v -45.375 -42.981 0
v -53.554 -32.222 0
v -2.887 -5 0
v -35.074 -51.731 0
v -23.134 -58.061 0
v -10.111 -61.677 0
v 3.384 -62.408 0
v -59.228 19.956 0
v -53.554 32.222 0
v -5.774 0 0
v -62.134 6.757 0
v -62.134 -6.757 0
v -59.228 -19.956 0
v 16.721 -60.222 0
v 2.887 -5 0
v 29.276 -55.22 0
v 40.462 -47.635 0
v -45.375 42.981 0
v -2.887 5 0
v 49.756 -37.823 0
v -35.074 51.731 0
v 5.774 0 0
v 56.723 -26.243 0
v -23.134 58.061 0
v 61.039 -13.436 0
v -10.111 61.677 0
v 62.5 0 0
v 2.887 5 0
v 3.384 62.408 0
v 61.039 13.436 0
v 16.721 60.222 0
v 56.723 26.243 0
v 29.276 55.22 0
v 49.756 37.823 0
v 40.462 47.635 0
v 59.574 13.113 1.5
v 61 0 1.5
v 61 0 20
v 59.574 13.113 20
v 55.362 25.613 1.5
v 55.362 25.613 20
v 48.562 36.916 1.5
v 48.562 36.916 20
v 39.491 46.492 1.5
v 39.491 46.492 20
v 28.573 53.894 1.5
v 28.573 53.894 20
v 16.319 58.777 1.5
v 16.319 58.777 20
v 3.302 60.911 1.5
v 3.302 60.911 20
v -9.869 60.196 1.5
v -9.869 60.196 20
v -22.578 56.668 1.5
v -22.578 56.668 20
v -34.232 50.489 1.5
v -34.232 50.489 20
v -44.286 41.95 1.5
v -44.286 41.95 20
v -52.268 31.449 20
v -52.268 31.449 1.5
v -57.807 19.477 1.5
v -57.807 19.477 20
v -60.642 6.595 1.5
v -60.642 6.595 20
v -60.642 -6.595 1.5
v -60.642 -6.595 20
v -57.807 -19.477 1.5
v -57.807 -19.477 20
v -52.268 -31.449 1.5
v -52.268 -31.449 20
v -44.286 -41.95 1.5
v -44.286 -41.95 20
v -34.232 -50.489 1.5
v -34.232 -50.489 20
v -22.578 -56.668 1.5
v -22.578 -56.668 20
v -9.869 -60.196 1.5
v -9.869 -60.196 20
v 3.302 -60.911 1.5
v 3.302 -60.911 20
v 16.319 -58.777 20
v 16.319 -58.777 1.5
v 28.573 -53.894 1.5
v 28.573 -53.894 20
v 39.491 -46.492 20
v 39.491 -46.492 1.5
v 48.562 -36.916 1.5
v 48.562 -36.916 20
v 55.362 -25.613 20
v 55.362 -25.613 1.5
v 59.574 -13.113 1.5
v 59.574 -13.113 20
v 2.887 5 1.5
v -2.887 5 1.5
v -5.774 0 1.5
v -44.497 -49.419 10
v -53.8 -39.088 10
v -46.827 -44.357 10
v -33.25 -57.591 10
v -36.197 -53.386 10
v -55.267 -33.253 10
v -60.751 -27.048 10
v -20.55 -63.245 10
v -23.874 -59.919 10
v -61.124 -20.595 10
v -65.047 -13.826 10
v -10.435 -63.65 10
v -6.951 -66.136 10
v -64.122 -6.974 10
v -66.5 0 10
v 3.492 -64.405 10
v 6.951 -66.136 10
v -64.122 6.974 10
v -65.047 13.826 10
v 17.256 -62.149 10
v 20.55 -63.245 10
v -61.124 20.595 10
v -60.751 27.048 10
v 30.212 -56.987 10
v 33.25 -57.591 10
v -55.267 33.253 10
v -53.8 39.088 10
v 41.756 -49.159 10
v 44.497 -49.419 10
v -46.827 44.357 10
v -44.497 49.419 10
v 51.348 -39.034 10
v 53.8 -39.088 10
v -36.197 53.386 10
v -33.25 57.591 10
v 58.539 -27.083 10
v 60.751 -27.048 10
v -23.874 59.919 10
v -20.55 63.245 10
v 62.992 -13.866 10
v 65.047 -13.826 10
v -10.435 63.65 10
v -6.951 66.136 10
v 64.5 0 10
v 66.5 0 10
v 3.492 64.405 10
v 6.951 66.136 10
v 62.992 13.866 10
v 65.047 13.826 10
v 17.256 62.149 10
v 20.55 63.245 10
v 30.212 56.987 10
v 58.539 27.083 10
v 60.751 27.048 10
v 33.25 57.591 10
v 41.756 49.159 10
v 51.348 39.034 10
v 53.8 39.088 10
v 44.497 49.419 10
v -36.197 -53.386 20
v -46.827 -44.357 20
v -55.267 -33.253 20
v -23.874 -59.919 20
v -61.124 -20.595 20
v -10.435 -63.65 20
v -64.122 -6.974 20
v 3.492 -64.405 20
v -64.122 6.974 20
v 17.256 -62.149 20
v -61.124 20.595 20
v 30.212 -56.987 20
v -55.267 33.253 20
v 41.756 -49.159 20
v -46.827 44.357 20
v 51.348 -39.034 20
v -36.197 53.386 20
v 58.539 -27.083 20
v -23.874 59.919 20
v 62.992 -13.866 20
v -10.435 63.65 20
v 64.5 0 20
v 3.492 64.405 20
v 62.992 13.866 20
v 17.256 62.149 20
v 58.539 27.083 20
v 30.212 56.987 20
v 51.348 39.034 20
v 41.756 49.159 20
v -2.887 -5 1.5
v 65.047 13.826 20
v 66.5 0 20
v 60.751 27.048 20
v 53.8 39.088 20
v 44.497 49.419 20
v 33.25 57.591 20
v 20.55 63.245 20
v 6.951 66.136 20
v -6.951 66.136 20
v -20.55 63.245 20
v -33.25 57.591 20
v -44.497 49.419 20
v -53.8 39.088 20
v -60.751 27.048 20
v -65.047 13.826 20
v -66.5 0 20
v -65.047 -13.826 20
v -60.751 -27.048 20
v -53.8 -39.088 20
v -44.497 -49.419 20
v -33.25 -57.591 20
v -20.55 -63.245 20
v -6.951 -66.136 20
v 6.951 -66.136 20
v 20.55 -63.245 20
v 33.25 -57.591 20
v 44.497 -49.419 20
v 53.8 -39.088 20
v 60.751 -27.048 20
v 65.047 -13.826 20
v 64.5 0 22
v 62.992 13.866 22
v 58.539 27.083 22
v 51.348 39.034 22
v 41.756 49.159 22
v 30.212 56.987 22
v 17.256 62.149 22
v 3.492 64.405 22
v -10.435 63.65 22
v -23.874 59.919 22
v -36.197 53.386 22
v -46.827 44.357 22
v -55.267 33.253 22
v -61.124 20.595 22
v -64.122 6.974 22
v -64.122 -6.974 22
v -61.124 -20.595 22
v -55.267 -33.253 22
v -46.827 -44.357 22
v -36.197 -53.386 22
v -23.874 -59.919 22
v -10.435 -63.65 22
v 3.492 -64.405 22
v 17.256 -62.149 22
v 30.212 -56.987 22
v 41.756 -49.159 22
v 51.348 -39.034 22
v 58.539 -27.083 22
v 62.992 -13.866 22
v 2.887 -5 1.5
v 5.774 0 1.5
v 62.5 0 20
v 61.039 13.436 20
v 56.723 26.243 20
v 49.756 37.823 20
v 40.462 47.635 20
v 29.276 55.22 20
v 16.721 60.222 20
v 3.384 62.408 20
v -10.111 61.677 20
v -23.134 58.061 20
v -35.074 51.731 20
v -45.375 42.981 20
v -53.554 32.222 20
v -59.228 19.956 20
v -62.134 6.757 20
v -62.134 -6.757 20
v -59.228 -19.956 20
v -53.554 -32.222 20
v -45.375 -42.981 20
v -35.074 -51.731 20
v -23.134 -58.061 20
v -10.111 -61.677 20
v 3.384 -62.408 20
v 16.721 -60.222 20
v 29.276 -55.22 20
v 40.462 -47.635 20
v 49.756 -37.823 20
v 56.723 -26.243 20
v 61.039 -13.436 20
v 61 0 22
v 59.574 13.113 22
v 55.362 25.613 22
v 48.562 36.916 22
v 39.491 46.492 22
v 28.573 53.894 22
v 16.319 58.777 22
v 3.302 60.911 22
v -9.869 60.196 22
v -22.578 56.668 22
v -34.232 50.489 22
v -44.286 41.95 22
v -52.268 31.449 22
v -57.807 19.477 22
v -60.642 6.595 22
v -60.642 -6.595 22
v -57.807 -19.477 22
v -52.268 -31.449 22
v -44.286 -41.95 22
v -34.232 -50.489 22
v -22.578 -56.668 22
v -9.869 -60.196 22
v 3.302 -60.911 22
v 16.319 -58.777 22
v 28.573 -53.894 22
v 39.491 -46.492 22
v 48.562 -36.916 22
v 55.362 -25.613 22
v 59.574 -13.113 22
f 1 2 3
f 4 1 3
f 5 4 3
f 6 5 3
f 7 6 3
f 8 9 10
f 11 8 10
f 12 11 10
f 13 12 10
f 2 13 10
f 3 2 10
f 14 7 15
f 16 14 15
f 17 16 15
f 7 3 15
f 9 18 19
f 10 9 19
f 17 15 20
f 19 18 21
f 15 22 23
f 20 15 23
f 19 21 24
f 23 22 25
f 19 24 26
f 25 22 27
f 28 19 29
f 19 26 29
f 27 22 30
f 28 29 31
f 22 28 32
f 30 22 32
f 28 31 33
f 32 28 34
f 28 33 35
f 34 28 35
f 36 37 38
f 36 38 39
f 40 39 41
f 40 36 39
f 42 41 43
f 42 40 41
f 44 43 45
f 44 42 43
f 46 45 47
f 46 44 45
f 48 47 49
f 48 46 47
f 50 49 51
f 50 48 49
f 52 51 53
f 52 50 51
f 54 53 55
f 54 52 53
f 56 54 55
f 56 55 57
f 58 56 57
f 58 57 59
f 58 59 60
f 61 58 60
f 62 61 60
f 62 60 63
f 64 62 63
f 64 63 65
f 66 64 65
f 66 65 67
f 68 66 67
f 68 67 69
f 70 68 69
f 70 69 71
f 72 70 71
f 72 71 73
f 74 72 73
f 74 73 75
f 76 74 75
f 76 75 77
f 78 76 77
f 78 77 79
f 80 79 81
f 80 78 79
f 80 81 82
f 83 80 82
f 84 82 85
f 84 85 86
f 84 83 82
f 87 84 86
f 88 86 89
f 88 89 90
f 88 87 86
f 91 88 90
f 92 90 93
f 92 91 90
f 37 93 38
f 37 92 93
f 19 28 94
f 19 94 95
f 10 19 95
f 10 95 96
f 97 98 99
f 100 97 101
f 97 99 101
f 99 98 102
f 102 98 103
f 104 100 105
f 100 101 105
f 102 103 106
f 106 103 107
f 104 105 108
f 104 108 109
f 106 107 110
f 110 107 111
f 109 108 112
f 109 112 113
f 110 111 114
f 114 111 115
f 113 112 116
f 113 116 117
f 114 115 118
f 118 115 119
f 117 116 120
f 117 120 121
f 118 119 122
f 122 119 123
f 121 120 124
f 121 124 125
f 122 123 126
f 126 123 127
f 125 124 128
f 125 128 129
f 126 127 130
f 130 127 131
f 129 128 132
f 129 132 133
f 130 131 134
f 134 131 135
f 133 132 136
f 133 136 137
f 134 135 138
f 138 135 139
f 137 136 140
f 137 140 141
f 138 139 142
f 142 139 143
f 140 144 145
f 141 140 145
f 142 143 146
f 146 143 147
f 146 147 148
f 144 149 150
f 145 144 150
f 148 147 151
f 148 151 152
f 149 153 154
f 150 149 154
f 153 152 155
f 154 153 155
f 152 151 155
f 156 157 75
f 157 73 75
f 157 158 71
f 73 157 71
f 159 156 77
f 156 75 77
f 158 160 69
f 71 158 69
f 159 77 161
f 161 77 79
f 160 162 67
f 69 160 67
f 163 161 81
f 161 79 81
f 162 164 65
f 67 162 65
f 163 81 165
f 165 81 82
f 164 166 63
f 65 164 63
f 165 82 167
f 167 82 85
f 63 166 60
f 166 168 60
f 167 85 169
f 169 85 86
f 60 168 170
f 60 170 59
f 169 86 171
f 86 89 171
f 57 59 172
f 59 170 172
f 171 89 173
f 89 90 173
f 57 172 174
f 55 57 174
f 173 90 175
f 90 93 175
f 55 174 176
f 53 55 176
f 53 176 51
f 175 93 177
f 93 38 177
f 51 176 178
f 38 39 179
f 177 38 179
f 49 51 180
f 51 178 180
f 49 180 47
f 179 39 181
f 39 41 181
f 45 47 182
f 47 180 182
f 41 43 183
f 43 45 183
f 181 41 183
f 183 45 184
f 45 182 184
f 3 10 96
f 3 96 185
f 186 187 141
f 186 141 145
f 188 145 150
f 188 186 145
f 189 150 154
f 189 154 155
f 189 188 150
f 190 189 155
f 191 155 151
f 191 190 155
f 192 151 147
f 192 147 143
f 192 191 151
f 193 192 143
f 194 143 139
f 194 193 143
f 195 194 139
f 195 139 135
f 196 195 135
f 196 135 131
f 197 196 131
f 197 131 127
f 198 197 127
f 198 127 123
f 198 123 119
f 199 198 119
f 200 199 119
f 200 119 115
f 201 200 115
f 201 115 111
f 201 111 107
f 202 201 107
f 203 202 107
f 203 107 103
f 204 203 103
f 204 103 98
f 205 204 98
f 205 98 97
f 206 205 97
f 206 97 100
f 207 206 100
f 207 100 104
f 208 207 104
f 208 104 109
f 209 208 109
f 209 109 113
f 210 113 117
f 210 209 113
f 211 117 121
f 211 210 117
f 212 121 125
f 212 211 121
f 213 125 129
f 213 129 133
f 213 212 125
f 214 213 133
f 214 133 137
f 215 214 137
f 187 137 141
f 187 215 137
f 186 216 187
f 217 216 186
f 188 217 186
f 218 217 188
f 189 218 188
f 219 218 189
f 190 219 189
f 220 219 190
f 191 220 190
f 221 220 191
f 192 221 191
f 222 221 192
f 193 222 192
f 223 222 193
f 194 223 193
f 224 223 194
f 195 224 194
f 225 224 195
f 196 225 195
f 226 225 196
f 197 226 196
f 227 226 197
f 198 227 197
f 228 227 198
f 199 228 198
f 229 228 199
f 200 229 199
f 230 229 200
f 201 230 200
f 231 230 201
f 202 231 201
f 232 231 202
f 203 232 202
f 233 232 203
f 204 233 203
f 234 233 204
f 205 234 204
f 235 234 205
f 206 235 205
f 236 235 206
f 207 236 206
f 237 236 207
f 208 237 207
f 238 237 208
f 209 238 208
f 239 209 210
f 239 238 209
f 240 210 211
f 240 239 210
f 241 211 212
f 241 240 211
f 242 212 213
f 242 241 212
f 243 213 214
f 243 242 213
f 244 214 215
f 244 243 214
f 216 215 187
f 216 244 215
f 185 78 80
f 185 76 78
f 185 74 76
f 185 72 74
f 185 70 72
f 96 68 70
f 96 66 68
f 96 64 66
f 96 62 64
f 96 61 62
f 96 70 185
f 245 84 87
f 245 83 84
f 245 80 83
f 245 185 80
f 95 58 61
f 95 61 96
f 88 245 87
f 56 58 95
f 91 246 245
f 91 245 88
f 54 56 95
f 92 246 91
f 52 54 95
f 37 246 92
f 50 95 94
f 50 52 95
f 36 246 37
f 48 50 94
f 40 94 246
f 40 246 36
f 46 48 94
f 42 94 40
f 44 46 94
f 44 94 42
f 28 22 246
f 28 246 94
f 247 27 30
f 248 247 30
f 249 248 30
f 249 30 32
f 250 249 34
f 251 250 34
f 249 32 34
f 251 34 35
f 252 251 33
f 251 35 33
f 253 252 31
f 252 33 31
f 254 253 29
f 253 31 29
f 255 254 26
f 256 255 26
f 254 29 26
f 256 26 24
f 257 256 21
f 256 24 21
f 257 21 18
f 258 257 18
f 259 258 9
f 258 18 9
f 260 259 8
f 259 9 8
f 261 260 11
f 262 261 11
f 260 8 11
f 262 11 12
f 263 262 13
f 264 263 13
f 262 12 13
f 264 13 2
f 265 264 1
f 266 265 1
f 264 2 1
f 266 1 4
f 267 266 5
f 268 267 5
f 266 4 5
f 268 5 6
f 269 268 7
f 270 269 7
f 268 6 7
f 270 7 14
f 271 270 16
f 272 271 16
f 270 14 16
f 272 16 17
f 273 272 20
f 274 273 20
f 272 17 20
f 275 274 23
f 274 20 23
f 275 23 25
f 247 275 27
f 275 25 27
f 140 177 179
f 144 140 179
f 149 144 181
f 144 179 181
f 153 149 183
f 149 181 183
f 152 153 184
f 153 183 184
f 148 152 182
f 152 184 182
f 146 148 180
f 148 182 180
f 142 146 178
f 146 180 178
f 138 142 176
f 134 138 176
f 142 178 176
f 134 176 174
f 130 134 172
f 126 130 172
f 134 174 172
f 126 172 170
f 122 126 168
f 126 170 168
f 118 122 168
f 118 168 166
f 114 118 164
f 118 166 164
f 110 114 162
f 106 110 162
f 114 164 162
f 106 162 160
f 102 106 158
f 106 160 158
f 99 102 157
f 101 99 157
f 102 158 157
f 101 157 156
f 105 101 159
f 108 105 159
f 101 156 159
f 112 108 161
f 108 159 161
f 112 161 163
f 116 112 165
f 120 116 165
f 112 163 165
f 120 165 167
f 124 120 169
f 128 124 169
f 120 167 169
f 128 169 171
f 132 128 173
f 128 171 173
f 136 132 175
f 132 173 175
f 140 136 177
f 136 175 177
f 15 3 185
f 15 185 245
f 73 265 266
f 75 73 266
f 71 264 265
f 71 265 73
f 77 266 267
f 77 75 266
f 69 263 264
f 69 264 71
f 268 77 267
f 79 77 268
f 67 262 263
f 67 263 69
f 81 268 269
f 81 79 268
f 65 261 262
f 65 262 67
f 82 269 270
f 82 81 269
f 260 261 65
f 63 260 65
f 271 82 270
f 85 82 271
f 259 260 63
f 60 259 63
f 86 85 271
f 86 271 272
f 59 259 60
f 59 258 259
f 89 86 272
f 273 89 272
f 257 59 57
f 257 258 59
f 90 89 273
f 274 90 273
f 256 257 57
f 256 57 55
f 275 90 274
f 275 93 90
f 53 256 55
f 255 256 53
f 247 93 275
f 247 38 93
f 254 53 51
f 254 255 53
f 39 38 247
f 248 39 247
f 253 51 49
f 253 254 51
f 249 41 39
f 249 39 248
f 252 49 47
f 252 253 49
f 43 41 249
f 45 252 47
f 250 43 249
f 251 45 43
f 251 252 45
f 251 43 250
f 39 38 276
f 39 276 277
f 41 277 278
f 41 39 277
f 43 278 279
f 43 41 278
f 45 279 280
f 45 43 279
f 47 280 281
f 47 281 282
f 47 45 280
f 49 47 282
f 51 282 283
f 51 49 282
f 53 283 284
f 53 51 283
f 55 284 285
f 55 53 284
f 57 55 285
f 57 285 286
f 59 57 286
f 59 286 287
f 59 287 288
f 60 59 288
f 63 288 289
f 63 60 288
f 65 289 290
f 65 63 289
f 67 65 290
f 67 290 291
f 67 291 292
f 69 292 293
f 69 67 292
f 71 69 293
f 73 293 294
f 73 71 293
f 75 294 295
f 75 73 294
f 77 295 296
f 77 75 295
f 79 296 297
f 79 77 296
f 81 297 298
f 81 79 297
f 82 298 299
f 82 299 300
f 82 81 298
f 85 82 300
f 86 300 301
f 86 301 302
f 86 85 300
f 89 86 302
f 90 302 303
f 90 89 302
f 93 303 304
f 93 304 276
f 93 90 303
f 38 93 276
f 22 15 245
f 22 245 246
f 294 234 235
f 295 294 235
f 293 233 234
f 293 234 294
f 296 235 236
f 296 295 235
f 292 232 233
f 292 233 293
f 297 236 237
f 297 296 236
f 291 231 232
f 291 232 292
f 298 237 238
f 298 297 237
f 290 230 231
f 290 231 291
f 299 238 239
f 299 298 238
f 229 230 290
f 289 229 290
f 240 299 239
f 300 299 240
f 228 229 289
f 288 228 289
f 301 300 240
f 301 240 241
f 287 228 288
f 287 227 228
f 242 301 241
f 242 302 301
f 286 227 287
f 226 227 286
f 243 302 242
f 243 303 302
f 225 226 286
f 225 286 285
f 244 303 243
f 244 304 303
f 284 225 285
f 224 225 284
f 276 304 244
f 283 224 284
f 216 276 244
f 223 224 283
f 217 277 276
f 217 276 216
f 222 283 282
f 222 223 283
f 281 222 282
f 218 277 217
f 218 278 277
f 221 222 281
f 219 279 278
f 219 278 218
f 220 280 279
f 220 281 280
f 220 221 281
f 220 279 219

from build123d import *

# Parameters (mm, degrees)
F0_R     = 62.5
F1_DEPTH = 20
F2_T     = -1.5
F3_DEPTH = 25
F4_R     = 66.5
F4_R_2   = 64.5
F4_R_3   = 62.5
F4_R_4   = 61
F5_DEPTH = 2
F6_DEPTH = 10
F7_SIZE  = 1.99999


# Not quite as in the source:
# - a fillet or chamfer is up to 0.001 mm smaller than in the source, because OpenCascade refuses the exact size


with BuildPart() as f1:
    # F0 (on Top) → F1 (new body)
    with BuildSketch(Plane.XY):
        Circle(F0_R)
        Polygon((5.7735026919, 0), (2.8867513459, -5), (-2.8867513459, -5), (-5.7735026919, 0), (-2.8867513459, 5), (2.8867513459, 5), align=None, mode=Mode.SUBTRACT)
        Polygon((-2.8867513459, -5), (2.8867513459, -5), (5.7735026919, 0), (2.8867513459, 5), (-2.8867513459, 5), (-5.7735026919, 0), align=None)
    extrude(amount=F1_DEPTH)

    # F2
    f2_openings = [f1.faces().sort_by_distance(p)[0] for p in [
        (0, 0, 20),
    ]]
    offset(amount=F2_T, openings=f2_openings)

    # F0 (on Top) → F3 (cut)
    with BuildSketch(Plane.XY):
        Polygon((-2.8867513459, -5), (2.8867513459, -5), (5.7735026919, 0), (2.8867513459, 5), (-2.8867513459, 5), (-5.7735026919, 0), align=None)
    extrude(amount=F3_DEPTH, mode=Mode.SUBTRACT)


with BuildPart() as f5:
    # F4 (on face) → F5 (new body)
    with BuildSketch(Plane.XY.offset(20)):
        Circle(F4_R)
        Circle(F4_R_2, mode=Mode.SUBTRACT)
        Circle(F4_R_2)
        Circle(F4_R_3, mode=Mode.SUBTRACT)
        Circle(F4_R_3)
        Circle(F4_R_4, mode=Mode.SUBTRACT)
    extrude(amount=F5_DEPTH)

    # F4 (on face) → F6 (join)
    with BuildSketch(Plane.XY.offset(20)):
        Circle(F4_R)
        Circle(F4_R_2, mode=Mode.SUBTRACT)
    extrude(amount=-F6_DEPTH)

    # F7 (size 2 in the source; OpenCascade refuses exactly that, so slightly less here)
    f7_edges = [f5.edges().sort_by_distance(p)[0] for p in [
        (-66.5, 0, 22),
    ]]
    chamfer(f7_edges, length=F7_SIZE)


solid = Compound([f1.part, f5.part])
